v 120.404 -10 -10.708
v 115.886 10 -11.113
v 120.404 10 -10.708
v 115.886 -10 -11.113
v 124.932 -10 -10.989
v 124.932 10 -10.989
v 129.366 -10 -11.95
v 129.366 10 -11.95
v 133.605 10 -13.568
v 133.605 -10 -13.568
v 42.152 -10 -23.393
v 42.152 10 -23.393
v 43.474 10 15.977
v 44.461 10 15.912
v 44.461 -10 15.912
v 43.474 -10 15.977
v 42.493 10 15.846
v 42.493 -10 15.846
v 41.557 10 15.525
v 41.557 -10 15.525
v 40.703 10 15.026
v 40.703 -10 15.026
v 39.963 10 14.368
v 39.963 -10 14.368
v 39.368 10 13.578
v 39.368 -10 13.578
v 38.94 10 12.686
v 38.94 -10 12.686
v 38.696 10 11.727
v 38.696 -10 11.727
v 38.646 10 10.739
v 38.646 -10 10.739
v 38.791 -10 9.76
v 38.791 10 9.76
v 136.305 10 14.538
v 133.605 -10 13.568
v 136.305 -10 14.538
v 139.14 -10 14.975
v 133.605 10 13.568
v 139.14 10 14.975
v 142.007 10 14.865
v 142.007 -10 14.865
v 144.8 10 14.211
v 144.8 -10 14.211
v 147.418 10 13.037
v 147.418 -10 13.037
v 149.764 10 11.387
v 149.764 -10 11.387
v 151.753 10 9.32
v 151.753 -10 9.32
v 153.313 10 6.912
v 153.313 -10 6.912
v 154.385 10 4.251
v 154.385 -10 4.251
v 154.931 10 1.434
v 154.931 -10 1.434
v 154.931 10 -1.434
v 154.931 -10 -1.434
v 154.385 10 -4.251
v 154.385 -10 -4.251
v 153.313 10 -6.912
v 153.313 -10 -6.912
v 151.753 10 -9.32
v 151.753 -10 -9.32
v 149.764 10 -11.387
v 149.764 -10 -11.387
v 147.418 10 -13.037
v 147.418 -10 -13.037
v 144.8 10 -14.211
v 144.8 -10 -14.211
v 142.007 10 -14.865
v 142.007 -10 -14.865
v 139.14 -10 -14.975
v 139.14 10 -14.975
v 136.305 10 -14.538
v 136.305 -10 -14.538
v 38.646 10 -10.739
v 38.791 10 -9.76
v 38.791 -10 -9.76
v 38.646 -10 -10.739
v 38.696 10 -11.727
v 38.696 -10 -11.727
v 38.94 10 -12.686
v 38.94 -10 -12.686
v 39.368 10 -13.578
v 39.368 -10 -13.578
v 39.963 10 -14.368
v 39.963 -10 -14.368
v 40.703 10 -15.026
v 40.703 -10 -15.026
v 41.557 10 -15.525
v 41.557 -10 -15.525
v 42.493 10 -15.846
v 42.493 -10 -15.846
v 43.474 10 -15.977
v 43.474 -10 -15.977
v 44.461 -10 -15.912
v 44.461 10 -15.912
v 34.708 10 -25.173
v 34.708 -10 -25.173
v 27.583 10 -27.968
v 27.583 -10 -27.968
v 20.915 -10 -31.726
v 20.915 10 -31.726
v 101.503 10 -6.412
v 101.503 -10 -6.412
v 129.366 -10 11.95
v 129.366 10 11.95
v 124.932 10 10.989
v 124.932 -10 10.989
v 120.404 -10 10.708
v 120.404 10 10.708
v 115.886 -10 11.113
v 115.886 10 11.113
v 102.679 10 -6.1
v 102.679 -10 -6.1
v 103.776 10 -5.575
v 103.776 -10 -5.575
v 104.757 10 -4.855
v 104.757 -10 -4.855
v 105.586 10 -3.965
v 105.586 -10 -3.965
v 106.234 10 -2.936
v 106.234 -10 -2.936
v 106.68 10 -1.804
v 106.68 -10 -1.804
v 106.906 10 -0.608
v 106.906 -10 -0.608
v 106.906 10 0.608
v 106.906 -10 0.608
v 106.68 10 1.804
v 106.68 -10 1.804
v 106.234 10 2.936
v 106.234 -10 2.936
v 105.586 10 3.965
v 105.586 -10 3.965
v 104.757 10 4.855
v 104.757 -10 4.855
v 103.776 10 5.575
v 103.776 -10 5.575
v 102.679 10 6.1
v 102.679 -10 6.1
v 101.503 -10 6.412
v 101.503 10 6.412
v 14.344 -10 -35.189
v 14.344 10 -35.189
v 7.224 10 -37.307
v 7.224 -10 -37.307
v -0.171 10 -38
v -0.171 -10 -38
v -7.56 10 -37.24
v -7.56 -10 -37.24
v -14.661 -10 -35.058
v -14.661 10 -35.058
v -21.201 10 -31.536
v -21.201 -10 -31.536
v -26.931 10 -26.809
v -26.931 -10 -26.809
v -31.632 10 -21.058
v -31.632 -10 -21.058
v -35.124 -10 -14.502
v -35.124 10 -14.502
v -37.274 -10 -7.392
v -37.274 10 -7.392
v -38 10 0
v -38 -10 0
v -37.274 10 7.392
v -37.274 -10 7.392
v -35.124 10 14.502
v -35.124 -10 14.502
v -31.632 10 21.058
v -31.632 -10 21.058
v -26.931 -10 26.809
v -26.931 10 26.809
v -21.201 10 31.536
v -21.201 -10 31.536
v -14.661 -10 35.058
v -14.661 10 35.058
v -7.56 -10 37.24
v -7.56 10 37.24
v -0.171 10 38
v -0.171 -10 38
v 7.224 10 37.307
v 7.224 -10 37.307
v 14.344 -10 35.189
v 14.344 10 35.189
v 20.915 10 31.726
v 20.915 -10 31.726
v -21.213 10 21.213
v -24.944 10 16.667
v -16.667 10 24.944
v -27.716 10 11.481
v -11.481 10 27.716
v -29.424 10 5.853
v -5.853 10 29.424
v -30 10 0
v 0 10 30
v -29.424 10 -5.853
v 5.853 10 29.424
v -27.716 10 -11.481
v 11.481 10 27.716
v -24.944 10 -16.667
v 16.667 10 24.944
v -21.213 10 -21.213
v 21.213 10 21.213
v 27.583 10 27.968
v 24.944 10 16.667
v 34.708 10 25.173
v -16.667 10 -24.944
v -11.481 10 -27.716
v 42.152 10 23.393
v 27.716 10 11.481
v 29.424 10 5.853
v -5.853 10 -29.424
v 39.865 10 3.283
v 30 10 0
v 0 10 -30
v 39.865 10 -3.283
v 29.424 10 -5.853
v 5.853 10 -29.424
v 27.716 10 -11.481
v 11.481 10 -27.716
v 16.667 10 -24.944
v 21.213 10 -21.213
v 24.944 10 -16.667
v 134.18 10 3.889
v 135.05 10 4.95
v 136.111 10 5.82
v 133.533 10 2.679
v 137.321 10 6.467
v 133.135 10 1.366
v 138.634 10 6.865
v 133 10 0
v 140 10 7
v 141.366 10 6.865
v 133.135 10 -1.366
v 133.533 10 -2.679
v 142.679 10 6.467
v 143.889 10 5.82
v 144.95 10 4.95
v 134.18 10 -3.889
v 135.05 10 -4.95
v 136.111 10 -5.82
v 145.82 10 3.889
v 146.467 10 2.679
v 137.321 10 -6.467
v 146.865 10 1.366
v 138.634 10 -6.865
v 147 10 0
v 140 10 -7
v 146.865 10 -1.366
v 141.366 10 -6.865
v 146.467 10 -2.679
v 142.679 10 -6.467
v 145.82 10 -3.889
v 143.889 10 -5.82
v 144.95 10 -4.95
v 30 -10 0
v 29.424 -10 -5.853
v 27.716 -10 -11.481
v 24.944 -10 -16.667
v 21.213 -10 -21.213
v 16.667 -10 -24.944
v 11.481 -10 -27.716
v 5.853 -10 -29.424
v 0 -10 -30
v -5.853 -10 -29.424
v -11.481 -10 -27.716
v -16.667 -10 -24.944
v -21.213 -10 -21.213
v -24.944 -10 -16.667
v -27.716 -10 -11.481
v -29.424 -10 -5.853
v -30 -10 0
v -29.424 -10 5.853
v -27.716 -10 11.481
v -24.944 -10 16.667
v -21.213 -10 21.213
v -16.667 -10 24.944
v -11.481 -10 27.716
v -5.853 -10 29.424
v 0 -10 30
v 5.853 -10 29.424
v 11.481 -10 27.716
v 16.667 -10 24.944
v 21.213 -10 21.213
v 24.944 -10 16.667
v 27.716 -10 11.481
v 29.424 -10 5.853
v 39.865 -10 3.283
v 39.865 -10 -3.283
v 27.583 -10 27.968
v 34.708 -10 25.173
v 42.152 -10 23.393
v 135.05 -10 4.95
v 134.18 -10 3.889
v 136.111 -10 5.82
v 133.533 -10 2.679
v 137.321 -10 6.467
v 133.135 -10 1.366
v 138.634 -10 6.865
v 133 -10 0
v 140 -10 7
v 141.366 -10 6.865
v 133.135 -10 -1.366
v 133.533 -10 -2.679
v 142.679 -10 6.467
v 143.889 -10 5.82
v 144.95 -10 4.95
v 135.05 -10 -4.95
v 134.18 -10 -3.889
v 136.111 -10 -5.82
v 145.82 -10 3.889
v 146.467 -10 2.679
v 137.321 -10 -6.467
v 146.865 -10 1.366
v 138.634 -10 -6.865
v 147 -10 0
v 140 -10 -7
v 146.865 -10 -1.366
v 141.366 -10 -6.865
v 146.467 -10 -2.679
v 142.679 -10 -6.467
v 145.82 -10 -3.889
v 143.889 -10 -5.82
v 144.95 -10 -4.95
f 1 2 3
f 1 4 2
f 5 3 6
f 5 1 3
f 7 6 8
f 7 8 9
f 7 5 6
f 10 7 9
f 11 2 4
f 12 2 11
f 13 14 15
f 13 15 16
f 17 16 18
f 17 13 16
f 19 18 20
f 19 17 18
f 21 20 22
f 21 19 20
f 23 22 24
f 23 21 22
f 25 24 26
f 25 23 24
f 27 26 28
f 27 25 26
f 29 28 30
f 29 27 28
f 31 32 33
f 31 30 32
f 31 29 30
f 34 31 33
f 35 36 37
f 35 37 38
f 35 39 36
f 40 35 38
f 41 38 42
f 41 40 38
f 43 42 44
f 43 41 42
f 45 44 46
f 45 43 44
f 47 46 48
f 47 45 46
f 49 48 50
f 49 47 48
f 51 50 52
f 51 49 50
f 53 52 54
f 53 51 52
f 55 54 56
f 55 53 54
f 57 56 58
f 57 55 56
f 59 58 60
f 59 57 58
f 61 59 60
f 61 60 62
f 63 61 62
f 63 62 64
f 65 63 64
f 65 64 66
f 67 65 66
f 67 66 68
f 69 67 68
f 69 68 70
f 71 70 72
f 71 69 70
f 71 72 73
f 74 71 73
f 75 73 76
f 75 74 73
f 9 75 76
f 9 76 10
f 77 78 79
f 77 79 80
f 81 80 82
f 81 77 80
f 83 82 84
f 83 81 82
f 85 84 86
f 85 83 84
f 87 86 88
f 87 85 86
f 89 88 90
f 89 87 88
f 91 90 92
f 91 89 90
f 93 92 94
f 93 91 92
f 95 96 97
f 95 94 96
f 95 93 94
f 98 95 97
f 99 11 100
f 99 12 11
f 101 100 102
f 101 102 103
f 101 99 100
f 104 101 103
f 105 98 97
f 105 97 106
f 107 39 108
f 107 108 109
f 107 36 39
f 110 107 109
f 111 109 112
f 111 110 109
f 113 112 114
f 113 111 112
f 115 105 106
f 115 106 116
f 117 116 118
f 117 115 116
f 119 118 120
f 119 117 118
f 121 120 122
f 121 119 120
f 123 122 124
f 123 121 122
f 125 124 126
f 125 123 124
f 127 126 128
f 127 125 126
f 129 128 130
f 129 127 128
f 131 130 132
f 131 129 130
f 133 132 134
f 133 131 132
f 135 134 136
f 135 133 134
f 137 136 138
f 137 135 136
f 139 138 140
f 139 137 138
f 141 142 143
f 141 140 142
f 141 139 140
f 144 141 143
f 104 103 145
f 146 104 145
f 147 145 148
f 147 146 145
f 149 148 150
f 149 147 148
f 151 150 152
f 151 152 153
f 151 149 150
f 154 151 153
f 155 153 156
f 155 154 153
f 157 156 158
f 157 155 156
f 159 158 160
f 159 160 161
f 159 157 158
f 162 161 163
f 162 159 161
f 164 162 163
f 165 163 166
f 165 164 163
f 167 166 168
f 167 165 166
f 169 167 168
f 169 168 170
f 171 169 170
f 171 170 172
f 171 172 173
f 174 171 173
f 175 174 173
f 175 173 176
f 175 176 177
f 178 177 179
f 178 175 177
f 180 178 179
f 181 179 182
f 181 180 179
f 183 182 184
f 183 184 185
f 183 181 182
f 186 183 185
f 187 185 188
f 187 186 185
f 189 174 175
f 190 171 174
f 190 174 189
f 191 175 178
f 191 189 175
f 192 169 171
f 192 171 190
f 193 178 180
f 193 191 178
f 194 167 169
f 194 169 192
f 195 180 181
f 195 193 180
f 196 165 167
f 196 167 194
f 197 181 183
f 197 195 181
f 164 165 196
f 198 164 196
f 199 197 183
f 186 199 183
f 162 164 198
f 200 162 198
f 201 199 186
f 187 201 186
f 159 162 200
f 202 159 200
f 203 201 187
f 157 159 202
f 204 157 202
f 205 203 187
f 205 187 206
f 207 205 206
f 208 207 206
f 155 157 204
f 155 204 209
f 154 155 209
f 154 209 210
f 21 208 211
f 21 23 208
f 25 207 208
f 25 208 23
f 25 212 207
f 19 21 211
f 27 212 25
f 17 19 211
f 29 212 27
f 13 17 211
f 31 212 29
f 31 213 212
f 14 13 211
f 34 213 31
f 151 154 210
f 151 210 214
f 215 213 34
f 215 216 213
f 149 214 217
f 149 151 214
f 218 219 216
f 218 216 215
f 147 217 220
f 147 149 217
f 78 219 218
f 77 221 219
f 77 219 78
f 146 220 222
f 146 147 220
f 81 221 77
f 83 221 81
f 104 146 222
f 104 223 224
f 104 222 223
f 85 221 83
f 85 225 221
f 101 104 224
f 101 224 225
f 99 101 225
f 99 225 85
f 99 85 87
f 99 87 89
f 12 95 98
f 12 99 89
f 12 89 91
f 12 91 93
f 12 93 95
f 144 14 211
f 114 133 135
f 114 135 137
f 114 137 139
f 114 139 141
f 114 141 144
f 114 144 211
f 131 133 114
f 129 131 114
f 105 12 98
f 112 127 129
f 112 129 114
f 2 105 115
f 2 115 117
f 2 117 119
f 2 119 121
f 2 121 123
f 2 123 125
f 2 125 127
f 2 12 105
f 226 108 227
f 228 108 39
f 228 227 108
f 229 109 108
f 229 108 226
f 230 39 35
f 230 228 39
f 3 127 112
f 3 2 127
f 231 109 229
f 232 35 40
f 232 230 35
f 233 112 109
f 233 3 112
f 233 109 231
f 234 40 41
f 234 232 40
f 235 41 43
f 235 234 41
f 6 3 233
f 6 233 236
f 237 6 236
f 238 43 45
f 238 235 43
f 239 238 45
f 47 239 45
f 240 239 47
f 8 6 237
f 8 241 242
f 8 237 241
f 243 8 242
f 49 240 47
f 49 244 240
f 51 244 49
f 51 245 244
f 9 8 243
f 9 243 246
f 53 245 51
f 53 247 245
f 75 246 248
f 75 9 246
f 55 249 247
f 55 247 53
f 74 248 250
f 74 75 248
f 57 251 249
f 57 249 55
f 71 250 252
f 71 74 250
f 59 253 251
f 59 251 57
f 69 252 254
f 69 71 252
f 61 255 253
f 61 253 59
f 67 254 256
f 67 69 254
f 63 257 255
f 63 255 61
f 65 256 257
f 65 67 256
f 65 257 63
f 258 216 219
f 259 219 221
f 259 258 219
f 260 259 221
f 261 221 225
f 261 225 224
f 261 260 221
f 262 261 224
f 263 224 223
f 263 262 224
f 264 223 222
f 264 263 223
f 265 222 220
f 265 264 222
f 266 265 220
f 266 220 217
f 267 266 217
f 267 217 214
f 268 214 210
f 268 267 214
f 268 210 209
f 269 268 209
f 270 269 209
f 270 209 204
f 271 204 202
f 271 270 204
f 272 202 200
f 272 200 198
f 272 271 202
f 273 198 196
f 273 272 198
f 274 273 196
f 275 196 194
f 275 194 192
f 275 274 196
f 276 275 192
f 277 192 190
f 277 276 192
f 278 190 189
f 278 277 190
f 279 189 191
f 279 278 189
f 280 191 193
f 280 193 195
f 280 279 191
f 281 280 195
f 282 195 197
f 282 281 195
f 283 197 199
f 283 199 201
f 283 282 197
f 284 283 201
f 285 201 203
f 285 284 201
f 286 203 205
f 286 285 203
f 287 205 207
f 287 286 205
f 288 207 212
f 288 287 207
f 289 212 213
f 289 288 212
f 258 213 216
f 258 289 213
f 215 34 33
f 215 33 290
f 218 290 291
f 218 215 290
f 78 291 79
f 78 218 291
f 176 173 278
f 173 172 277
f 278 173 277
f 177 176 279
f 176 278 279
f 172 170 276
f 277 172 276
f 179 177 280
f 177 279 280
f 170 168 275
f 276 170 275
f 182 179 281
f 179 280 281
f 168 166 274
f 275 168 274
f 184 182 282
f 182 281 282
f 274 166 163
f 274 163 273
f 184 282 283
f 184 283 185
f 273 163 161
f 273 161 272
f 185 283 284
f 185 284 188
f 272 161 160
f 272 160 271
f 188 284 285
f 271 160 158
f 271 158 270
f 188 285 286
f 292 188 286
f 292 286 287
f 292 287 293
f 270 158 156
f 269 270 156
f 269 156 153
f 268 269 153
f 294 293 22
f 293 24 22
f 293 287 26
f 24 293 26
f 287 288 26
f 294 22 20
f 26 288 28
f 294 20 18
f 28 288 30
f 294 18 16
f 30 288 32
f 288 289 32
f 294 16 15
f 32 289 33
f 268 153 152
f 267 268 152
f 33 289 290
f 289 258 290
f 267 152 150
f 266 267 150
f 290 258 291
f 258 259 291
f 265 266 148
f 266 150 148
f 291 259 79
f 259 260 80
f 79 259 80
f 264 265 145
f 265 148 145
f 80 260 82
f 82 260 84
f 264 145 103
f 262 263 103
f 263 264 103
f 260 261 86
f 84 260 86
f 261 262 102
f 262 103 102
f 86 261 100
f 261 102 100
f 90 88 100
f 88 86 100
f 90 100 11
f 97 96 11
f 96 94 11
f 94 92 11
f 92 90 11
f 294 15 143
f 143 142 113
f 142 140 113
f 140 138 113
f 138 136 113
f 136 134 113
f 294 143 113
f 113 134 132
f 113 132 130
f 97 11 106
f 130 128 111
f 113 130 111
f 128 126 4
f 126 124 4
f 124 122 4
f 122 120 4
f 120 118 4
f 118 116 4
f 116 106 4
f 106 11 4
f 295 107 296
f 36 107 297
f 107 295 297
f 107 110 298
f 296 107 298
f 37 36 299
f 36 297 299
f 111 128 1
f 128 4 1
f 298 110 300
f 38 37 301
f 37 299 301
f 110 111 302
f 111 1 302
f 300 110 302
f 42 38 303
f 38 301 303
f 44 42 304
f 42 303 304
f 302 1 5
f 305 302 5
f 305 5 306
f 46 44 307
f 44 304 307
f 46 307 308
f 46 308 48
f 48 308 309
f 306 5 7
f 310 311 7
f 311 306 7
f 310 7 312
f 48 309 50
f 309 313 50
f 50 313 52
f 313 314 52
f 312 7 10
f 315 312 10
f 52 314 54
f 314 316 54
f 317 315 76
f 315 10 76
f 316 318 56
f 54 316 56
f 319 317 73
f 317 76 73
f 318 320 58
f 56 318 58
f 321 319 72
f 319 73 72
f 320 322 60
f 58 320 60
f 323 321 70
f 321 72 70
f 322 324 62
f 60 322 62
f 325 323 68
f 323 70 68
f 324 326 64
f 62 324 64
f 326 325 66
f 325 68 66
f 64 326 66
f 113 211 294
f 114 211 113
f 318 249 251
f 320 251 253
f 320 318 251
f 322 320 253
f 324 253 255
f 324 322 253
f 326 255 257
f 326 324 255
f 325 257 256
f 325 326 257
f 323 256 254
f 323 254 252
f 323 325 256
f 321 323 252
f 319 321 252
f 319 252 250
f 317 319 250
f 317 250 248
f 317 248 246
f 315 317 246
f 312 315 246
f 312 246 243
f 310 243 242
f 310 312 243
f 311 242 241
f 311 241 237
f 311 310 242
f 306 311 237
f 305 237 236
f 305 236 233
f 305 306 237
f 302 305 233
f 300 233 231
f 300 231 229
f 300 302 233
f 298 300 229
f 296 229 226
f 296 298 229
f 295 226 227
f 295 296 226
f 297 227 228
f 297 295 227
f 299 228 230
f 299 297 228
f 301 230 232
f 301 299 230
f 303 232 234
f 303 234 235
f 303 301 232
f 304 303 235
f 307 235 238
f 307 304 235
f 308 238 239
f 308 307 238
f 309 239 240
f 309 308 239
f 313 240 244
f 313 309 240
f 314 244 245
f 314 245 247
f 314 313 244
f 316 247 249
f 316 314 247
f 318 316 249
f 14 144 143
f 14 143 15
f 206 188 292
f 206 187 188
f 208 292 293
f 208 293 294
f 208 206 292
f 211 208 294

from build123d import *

# Parameters (mm, degrees)
SKETCH1_R           = 30
SKETCH1_R_2         = 7
BOSS_EXTRUDE1_DEPTH = 10
CUT_EXTRUDE1_DEPTH  = 21
FILLET1_R           = 30
FILLET2_R           = 55


with BuildPart() as part:
    # Sketch1 → Boss-Extrude1 (new body, symmetric)
    with BuildSketch(Plane(origin=(0, 0, 0), x_dir=(1, 0, 0), z_dir=(0, 1, 0))):
        with BuildLine():
            Line((128.063755469, 9.084385863), (27.935473676, 25.760615491))
            ThreePointArc((27.935473676, 25.760615491), (-38, 0), (27.935473676, -25.760615491))
            Line((27.935473676, -25.760615491), (128.063755469, -9.084385863))
            ThreePointArc((128.063755469, -9.084385863), (155, 0), (128.063755469, 9.084385863))
        make_face()
        Circle(SKETCH1_R, mode=Mode.SUBTRACT)
        with Locations((140, 0)):
            Circle(SKETCH1_R_2, mode=Mode.SUBTRACT)
    extrude(amount=BOSS_EXTRUDE1_DEPTH, both=True)

    # Sketch2 → Cut-Extrude1 (cut, through all)
    with BuildSketch(Plane(origin=(0, 10, 0), x_dir=(1, 0, 0), z_dir=(0, 1, 0))):
        with BuildLine():
            Line((44.461373165, 15.911828816), (101.502639752, 6.411683174))
            ThreePointArc((101.502639752, 6.411683174), (106.934782609, 0), (101.502639752, -6.411683174))
            Line((101.502639752, -6.411683174), (44.461373165, -15.911828816))
            ThreePointArc((44.461373165, -15.911828816), (39.963398771, -14.368423983), (38.791061861, -9.759790965))
            ThreePointArc((38.791061861, -9.759790965), (40, 0), (38.791061861, 9.759790965))
            ThreePointArc((38.791061861, 9.759790965), (39.963398771, 14.368423983), (44.461373165, 15.911828816))
        make_face()
    extrude(amount=-CUT_EXTRUDE1_DEPTH, mode=Mode.SUBTRACT)

    # Fillet1
    fillet1_edges = [part.edges().sort_by_distance(p)[0] for p in [
        (128.063755469, 0, 9.084385863),
        (128.063755469, 0, -9.084385863),
    ]]
    fillet(fillet1_edges, radius=FILLET1_R)

    # Fillet2
    fillet2_edges = [part.edges().sort_by_distance(p)[0] for p in [
        (27.935473676, 0, 25.760615491),
        (27.935473676, 0, -25.760615491),
    ]]
    fillet(fillet2_edges, radius=FILLET2_R)


solid = part.part
